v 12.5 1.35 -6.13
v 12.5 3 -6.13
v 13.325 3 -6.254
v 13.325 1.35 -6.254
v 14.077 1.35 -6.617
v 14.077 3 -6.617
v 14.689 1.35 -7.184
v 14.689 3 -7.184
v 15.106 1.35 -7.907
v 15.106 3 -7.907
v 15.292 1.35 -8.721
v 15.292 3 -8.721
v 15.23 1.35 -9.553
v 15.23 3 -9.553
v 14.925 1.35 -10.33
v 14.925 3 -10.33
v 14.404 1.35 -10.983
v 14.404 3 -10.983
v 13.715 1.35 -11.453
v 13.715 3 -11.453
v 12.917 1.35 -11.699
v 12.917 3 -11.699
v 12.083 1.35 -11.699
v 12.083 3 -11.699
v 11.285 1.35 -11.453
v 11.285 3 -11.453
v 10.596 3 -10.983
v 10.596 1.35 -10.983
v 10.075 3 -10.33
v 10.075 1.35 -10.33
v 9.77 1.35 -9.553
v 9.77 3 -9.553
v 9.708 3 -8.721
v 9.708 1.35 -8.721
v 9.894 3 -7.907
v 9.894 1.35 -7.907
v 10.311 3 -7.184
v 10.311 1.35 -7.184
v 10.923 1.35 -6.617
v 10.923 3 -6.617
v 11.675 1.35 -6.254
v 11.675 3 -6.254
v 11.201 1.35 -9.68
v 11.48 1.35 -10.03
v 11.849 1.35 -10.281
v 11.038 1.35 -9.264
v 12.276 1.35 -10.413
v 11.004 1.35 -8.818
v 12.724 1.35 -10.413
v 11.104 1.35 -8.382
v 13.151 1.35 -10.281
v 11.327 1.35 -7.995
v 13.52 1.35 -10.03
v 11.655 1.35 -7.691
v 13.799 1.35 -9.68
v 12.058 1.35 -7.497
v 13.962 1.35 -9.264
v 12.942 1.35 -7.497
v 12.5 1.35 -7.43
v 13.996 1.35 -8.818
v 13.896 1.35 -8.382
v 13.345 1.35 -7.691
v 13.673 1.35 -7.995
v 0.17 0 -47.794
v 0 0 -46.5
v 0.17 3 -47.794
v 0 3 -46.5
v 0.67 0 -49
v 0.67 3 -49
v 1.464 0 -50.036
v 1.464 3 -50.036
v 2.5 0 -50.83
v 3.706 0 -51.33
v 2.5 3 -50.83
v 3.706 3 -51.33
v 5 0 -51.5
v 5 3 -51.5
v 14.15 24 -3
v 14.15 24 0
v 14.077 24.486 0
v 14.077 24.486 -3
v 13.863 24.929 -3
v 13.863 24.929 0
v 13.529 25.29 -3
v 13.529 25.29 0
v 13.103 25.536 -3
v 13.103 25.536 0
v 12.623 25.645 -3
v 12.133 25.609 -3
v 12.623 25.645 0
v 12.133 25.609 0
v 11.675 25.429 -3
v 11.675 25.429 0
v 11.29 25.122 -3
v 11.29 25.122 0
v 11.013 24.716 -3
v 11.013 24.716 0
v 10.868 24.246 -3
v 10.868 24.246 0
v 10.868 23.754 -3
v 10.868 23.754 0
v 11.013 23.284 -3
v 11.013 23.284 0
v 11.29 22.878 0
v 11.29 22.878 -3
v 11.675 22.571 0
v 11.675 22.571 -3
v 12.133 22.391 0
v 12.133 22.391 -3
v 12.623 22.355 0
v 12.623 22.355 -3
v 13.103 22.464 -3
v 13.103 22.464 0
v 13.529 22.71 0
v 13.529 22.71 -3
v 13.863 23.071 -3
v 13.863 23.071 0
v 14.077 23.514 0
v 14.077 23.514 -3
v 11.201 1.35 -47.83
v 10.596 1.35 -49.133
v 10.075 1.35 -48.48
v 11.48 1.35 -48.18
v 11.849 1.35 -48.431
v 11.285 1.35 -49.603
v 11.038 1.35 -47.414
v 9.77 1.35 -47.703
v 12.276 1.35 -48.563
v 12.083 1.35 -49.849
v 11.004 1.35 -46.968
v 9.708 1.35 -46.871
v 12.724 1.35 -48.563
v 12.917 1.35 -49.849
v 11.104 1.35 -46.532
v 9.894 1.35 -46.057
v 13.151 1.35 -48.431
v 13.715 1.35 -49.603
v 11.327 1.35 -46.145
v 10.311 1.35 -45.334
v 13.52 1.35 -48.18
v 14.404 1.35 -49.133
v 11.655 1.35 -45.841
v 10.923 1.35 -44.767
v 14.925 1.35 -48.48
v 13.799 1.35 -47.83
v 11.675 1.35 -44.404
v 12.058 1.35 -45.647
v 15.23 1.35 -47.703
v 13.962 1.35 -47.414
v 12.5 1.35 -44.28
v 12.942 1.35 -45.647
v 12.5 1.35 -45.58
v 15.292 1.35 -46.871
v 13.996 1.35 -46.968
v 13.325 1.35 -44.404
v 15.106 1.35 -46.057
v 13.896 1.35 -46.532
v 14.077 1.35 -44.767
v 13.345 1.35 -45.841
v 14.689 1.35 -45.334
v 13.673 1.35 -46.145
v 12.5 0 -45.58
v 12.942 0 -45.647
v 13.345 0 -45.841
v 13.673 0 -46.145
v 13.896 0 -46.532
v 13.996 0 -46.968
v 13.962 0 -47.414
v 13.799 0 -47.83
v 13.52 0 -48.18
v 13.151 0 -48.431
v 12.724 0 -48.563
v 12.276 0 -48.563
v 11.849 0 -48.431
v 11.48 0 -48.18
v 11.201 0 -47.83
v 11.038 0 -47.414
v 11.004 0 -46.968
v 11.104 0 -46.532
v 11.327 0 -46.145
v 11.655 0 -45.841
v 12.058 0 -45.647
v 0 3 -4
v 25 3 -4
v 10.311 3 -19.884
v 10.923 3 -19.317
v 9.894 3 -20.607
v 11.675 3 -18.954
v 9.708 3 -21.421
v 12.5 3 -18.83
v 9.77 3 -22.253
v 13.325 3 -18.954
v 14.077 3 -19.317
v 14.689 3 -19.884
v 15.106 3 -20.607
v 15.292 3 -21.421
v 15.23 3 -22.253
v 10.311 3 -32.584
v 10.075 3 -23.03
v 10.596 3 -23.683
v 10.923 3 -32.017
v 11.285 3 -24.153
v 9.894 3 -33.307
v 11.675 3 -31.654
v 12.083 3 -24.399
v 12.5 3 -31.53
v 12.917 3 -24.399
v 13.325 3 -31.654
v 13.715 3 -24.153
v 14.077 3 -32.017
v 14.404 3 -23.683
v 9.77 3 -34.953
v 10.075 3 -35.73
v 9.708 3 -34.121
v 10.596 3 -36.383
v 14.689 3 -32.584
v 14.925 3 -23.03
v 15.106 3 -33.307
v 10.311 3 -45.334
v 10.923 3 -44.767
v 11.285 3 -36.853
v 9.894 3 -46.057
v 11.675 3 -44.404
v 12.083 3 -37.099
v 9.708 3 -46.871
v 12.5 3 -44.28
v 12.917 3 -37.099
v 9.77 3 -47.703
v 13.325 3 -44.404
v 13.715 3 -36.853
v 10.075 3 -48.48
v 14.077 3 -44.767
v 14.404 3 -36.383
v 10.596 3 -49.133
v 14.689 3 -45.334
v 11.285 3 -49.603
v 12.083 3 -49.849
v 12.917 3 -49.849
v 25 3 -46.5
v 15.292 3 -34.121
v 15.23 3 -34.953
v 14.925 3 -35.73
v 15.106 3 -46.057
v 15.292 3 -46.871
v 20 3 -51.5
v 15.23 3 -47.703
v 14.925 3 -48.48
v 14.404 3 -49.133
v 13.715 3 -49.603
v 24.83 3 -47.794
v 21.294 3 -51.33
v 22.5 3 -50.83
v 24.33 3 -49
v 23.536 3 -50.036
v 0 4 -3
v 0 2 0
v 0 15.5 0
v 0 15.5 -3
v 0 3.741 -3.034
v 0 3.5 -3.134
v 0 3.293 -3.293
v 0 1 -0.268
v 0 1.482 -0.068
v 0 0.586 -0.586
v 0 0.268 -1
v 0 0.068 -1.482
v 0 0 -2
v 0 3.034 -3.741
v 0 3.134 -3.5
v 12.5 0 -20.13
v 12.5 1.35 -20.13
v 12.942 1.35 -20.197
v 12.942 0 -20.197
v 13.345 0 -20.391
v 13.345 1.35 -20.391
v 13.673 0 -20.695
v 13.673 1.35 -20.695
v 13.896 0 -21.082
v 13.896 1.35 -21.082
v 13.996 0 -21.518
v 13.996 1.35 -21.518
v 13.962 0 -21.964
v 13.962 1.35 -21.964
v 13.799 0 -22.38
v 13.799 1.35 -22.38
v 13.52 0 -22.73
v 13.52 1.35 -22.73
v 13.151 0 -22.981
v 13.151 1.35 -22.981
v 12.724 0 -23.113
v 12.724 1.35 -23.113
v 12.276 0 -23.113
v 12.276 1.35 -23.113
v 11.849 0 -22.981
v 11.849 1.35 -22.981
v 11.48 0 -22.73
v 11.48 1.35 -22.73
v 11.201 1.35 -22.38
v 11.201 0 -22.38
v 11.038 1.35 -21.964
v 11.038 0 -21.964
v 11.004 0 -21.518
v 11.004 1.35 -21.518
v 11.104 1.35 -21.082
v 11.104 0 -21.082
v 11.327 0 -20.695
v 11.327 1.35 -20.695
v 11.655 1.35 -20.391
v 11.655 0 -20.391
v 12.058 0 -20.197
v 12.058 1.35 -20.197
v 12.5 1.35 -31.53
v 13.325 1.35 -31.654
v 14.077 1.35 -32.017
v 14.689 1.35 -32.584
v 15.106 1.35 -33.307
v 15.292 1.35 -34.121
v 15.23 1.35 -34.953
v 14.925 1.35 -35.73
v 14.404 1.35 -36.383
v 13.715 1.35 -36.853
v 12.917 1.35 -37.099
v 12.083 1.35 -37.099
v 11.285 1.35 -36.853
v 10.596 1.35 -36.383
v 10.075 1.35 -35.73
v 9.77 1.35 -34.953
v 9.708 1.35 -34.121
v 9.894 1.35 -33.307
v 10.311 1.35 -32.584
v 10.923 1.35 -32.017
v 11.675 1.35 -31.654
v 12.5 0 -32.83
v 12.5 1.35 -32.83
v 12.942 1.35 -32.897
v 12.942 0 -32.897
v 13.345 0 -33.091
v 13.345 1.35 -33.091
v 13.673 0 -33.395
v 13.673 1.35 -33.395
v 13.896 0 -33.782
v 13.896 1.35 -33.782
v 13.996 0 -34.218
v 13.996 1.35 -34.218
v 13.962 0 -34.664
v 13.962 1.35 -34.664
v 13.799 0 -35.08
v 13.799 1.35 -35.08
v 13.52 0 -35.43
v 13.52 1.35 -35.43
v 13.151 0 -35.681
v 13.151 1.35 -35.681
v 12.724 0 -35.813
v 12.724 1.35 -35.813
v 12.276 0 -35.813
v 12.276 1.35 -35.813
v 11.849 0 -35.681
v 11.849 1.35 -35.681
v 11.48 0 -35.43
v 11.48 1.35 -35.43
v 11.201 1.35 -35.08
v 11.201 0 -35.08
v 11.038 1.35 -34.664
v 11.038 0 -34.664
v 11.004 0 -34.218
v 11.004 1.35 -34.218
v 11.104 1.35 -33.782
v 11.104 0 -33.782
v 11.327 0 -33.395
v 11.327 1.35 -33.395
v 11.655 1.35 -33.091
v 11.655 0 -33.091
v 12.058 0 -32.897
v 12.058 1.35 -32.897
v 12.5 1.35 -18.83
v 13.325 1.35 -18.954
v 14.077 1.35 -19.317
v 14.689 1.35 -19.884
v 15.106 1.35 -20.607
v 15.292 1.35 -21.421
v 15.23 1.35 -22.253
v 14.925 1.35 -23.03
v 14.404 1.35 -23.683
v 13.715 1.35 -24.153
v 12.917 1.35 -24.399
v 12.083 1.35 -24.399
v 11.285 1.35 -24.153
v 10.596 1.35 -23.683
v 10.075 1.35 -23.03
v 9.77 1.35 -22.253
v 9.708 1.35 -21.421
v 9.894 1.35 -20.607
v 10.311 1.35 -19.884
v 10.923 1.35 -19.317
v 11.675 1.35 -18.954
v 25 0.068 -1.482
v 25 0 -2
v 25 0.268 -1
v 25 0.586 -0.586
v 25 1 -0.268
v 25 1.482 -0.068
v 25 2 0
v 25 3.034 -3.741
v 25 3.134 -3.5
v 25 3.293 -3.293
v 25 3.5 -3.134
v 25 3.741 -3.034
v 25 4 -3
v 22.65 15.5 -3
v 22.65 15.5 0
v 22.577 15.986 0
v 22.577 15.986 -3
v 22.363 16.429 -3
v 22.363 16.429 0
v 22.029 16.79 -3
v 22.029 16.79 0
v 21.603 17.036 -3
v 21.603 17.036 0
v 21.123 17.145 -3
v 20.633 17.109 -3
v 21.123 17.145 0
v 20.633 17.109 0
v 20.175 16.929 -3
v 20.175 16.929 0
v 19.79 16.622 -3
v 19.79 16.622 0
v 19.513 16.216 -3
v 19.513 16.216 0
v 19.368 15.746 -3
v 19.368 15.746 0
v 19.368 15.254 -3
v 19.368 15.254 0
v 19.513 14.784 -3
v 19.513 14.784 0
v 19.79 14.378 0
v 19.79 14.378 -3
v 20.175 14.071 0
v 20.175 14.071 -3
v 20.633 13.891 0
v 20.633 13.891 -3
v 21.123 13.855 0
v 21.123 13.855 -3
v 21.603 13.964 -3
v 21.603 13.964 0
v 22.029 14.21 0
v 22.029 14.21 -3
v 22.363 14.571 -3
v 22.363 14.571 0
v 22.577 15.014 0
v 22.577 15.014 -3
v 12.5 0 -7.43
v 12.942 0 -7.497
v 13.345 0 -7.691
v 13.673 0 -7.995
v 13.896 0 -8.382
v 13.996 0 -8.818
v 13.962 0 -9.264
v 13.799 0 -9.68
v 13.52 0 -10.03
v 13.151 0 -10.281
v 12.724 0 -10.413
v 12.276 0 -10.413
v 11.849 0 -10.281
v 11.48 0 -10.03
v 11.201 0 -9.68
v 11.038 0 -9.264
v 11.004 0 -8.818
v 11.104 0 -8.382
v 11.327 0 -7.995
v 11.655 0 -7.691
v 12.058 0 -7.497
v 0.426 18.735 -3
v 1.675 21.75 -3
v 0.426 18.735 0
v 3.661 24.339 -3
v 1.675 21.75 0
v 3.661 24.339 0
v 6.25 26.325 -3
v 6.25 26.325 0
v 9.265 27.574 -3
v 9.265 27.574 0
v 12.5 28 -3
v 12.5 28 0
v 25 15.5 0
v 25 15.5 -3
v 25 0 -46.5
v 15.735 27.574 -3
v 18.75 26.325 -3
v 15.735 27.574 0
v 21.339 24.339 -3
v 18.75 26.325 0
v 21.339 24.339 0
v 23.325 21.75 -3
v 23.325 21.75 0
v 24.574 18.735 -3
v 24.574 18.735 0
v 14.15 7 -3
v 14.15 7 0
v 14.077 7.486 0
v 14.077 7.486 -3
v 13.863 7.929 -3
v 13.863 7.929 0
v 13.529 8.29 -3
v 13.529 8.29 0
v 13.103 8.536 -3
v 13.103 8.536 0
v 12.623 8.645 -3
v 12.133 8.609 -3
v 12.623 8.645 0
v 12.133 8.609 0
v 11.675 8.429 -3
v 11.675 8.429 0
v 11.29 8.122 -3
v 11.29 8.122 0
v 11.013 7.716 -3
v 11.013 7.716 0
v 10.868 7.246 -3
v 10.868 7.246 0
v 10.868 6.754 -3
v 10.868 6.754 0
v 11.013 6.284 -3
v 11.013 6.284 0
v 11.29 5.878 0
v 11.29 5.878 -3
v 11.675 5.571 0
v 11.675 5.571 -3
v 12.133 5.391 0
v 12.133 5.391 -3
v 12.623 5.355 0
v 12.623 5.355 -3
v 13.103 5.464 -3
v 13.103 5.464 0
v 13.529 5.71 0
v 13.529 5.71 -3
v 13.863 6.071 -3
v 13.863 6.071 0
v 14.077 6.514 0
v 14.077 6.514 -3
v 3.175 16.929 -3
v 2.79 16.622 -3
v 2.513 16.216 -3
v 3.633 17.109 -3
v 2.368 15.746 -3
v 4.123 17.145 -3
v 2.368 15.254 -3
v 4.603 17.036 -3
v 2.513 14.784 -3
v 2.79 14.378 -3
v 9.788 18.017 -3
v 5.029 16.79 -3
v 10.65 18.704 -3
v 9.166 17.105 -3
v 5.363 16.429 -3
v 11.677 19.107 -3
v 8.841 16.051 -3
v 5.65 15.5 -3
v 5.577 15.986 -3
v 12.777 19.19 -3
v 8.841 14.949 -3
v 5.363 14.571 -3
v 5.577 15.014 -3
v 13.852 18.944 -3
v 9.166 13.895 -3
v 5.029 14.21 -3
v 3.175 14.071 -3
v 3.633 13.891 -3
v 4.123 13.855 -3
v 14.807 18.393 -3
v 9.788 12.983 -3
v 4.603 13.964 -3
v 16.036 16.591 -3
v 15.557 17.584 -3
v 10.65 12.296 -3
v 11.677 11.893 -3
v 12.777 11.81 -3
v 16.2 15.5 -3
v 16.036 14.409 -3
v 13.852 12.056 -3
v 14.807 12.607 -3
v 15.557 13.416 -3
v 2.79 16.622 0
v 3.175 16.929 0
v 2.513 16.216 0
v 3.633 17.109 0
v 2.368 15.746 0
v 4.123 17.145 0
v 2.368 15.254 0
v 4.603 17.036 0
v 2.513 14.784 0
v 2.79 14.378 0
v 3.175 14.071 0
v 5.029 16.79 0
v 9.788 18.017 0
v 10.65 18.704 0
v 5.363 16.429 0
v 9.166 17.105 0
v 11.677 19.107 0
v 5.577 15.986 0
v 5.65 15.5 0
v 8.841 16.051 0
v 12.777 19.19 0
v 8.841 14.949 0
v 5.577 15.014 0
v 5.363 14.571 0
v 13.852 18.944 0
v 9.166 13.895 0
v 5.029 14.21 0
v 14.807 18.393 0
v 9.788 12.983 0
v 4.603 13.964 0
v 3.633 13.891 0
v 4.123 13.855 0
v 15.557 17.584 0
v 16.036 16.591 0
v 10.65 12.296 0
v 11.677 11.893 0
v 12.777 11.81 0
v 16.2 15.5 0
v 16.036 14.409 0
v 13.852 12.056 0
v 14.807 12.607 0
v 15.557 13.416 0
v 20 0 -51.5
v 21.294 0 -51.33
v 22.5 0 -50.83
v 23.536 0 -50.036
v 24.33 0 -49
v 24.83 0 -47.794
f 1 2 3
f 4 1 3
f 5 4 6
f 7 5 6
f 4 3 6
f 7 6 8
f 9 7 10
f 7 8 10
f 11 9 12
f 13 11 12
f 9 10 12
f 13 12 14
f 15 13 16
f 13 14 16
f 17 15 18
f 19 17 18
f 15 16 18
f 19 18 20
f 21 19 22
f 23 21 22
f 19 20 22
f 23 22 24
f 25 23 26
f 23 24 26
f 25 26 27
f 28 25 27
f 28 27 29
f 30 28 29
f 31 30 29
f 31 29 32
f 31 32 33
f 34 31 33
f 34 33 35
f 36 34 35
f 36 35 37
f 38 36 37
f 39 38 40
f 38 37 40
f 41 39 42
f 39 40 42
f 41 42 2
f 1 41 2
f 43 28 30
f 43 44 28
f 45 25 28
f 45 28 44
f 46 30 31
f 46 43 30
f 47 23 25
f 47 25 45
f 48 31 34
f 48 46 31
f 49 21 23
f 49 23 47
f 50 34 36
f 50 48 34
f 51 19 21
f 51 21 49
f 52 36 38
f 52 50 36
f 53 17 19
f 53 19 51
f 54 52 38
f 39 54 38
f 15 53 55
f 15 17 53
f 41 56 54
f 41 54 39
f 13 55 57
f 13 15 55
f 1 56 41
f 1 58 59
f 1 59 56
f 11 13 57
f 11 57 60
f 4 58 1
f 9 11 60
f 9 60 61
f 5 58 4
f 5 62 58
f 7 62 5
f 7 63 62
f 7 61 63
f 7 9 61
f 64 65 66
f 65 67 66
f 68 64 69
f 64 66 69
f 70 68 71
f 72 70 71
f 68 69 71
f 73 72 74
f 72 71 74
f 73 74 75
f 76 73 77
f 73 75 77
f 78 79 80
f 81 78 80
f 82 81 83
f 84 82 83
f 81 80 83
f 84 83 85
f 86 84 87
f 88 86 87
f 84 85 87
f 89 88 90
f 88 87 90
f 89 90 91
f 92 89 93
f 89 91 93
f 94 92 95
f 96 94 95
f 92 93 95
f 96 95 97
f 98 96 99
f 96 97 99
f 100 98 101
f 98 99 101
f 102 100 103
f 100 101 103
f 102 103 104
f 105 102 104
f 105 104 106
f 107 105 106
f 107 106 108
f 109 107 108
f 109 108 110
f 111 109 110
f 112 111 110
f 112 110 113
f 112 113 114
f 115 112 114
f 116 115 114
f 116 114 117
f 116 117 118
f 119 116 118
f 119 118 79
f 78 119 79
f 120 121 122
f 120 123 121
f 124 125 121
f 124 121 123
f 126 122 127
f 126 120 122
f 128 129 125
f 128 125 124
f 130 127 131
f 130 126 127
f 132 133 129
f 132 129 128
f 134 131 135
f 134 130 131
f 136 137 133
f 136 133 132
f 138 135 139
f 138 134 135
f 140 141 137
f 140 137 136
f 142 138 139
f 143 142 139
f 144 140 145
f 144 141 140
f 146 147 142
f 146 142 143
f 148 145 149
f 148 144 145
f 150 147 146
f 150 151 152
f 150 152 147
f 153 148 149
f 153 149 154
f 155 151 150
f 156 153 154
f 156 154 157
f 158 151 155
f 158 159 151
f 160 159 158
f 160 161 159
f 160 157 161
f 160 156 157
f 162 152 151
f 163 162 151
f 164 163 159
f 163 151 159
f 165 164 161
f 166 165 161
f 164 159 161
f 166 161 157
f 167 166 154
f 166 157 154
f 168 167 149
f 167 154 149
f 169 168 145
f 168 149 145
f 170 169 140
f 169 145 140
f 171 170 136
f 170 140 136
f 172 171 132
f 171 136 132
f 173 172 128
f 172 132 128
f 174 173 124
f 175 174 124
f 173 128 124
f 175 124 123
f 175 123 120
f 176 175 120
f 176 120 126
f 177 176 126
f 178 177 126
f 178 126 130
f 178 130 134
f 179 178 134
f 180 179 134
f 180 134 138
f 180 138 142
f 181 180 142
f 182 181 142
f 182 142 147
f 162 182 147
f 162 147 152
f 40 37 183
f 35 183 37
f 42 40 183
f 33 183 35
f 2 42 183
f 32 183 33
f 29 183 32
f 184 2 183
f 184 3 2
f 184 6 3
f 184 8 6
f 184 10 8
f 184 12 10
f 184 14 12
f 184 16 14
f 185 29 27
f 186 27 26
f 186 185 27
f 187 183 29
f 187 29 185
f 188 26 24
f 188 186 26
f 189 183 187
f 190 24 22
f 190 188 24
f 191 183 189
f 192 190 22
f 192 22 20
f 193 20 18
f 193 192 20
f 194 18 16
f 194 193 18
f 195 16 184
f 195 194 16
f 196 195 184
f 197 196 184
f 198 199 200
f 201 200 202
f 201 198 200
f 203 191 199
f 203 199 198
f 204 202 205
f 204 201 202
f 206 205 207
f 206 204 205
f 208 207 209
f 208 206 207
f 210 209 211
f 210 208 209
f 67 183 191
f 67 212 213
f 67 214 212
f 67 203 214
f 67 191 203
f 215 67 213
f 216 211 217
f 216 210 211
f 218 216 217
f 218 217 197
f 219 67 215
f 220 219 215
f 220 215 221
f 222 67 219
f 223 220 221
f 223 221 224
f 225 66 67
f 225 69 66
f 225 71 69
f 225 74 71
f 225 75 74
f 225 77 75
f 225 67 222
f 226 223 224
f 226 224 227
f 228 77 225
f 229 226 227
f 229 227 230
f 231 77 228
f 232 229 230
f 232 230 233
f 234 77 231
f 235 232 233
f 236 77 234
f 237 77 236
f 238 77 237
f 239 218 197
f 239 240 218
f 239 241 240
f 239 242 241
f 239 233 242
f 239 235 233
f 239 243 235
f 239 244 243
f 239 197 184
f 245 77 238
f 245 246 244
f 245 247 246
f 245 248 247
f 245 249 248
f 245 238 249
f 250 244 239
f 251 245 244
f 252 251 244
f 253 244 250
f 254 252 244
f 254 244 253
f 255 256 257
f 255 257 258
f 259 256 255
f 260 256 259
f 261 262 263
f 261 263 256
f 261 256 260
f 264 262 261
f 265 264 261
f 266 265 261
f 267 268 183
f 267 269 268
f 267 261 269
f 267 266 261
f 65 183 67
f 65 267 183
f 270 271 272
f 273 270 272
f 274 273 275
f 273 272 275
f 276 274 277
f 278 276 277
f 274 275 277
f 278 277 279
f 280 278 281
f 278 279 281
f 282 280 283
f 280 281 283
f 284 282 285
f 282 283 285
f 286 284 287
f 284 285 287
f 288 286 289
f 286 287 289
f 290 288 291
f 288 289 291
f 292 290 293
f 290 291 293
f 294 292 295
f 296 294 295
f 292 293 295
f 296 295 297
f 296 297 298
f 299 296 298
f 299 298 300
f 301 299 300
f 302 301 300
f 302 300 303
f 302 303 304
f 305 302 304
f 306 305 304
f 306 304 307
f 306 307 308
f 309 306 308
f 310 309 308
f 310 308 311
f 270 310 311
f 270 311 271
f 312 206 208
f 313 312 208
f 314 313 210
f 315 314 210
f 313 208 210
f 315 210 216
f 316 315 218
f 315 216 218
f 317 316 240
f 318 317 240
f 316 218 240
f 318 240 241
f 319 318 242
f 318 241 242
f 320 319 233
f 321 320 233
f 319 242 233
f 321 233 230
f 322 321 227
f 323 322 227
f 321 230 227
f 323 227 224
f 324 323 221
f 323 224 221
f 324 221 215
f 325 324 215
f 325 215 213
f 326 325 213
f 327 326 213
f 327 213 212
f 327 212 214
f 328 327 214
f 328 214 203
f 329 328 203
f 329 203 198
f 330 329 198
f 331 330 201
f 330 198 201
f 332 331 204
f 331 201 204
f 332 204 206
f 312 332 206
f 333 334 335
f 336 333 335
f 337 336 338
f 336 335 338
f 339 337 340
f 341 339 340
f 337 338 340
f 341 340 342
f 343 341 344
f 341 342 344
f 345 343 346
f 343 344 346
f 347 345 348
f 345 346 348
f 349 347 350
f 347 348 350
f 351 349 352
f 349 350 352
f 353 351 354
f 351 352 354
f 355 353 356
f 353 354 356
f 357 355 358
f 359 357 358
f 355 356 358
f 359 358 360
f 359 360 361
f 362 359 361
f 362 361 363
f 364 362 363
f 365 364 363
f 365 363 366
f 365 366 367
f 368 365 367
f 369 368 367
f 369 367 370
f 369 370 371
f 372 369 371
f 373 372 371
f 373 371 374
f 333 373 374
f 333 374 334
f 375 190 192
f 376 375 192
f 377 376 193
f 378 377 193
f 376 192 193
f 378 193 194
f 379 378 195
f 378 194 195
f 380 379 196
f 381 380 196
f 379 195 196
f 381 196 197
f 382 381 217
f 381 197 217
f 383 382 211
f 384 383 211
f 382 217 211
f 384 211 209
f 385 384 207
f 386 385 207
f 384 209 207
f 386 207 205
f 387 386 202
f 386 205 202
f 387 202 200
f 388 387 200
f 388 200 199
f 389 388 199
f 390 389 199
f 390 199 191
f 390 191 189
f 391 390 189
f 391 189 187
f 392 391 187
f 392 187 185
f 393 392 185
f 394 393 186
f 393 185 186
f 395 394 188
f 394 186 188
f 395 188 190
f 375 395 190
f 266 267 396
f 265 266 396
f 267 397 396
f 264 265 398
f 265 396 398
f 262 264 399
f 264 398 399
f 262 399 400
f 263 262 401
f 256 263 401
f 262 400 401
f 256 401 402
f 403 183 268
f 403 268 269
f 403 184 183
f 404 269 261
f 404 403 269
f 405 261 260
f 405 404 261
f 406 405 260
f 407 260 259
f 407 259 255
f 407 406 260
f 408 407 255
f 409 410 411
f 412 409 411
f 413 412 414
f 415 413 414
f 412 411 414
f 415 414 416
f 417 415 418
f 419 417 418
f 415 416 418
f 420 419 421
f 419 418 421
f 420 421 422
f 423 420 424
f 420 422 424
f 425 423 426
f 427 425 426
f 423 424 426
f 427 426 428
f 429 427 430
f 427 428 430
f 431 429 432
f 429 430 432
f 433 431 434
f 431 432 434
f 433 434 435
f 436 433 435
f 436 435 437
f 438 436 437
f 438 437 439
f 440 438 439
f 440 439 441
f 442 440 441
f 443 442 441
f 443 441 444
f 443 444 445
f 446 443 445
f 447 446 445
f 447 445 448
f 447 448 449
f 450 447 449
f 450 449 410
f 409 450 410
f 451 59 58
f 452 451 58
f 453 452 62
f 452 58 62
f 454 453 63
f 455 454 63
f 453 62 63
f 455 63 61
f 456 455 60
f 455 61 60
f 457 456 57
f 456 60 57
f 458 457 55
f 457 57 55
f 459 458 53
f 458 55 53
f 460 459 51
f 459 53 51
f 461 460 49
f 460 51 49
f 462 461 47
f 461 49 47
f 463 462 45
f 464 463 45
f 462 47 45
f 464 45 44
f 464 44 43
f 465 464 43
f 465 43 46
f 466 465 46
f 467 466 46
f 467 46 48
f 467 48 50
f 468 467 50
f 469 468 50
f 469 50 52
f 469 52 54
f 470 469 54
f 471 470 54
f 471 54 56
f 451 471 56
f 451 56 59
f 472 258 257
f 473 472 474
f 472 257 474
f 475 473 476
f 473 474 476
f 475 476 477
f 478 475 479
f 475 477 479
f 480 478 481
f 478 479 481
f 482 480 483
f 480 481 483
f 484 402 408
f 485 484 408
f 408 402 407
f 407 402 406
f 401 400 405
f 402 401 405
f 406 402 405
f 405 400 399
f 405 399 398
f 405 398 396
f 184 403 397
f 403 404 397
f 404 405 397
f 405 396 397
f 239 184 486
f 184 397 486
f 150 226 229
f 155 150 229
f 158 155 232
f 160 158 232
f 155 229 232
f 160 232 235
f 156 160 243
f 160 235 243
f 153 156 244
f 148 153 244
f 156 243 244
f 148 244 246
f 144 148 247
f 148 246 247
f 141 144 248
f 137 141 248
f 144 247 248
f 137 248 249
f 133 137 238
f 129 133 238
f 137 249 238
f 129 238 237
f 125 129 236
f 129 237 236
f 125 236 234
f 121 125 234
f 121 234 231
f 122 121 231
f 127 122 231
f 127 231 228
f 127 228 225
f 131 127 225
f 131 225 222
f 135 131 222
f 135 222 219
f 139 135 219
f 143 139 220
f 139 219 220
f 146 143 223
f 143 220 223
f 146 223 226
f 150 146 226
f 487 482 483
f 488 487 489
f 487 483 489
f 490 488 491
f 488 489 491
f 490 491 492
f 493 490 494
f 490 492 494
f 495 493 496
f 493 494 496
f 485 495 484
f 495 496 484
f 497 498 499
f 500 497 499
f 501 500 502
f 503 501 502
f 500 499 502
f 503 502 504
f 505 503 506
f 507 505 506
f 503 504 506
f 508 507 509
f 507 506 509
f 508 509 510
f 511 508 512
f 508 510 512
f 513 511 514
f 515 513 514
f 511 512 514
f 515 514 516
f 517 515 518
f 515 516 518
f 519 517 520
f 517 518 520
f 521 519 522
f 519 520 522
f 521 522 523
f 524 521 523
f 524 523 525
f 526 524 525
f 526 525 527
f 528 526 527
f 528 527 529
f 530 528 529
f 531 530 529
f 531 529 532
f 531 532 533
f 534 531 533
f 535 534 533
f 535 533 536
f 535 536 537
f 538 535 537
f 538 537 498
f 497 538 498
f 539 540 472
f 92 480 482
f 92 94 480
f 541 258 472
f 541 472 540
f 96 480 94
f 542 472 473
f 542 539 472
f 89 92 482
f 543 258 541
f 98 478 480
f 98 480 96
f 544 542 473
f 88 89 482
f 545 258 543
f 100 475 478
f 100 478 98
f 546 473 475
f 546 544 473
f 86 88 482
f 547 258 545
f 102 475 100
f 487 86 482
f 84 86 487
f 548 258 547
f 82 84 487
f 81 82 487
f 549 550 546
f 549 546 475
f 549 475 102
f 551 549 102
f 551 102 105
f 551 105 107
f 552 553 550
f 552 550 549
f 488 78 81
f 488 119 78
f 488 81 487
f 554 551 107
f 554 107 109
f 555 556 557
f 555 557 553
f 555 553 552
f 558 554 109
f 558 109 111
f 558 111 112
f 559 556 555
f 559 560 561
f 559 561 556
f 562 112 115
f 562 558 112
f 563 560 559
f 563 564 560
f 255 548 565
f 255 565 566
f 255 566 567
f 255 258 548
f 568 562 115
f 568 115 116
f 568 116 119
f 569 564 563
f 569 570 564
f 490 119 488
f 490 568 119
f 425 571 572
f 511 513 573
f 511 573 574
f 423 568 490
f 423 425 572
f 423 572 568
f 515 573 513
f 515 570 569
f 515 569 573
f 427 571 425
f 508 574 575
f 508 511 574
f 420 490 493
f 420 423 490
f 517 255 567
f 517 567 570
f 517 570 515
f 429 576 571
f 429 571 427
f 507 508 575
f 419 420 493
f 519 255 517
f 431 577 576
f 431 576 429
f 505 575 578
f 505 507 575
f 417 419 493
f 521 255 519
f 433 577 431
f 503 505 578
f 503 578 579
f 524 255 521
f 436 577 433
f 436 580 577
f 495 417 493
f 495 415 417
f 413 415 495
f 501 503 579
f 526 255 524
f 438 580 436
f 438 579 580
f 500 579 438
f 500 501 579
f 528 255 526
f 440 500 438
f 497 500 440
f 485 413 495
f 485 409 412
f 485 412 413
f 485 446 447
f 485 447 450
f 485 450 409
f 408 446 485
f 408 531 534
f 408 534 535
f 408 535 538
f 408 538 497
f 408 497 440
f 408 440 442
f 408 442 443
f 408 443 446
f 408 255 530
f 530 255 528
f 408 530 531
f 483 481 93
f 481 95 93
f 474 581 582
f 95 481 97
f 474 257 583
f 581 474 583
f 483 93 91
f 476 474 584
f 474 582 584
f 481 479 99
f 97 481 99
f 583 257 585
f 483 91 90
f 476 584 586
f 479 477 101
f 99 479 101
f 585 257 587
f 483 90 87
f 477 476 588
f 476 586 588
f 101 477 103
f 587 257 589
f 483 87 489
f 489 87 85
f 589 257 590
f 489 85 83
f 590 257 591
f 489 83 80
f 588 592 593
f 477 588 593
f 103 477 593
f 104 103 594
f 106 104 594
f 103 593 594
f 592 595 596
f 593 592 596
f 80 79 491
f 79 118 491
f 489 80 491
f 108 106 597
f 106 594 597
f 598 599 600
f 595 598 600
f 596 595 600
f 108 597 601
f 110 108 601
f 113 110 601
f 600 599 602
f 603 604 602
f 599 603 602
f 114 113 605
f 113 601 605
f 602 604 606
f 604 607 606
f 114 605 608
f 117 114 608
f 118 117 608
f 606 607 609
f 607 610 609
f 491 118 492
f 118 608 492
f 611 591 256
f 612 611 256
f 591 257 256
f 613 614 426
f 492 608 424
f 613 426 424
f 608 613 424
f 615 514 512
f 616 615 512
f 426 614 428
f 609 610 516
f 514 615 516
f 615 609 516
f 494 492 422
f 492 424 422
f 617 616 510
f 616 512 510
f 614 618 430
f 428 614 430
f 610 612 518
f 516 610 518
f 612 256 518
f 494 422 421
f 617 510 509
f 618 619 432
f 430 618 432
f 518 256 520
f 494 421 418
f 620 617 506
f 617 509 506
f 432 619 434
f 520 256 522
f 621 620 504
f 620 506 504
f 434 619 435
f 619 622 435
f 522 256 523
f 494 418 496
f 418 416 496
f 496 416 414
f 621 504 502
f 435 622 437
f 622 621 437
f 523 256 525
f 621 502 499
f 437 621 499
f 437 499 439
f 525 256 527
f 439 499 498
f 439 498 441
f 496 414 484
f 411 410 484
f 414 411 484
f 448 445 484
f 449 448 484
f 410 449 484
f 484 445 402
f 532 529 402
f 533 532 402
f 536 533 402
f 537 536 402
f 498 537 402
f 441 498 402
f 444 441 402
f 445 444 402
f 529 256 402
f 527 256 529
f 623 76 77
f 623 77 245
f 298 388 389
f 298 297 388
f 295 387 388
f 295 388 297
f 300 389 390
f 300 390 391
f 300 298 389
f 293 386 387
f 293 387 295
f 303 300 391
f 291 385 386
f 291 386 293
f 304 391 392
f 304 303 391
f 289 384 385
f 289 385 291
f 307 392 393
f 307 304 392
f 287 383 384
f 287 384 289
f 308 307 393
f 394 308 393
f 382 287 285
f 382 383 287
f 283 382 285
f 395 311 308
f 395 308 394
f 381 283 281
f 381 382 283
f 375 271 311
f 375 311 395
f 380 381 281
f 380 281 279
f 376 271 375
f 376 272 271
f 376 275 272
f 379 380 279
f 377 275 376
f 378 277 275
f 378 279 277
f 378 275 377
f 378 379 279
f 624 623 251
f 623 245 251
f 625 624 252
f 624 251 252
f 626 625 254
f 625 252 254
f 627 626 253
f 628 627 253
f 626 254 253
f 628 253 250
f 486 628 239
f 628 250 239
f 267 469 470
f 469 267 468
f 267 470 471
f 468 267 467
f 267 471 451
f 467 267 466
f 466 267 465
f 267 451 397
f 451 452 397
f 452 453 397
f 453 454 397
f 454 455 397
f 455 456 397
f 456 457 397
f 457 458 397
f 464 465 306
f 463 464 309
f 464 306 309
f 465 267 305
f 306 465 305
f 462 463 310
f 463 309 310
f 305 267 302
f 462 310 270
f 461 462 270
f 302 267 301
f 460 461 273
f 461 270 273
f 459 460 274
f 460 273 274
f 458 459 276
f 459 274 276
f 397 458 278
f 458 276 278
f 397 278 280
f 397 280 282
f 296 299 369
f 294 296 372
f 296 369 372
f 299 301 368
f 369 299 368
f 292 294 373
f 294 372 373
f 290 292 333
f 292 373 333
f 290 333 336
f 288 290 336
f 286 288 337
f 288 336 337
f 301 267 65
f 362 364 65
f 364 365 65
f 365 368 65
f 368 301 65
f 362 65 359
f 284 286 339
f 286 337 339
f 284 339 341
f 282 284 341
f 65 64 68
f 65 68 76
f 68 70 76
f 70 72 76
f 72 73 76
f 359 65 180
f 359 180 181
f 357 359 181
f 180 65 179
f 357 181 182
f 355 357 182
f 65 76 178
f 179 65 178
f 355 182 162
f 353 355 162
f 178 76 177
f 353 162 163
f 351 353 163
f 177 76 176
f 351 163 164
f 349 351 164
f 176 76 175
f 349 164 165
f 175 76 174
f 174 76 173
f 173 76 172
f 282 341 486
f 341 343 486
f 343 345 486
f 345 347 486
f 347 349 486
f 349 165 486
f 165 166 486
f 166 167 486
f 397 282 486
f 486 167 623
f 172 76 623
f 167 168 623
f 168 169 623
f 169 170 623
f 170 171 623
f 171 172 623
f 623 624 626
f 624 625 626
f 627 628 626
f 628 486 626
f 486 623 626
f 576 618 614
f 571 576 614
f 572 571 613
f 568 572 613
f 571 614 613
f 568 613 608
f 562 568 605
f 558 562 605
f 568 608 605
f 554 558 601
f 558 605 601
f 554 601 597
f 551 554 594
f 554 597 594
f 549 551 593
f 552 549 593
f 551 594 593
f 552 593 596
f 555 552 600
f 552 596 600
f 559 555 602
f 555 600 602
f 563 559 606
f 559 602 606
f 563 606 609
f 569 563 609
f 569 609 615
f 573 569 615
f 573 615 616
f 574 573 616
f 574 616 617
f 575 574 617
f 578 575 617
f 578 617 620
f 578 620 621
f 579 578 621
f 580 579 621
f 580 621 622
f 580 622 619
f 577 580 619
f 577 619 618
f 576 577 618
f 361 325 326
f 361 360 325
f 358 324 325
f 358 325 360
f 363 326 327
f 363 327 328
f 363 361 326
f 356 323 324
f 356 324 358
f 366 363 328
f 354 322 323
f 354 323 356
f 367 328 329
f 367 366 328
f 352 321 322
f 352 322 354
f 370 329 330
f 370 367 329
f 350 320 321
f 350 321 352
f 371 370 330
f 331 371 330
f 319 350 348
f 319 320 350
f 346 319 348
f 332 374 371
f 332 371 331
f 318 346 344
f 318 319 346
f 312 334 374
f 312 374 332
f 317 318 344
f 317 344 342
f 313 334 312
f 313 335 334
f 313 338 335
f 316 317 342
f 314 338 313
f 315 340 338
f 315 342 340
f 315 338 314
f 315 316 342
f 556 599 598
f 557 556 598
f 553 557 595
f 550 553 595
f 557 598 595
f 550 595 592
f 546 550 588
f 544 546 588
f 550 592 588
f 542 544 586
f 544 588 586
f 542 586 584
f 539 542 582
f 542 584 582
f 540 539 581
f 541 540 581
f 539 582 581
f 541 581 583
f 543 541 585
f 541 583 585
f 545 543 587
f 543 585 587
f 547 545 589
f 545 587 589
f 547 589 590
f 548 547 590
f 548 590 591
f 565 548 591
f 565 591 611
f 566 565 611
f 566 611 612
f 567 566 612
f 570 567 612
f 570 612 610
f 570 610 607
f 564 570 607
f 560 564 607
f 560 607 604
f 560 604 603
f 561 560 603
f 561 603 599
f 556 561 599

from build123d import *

# Parameters (mm, degrees)
ESBO_O1_W                = 25
ESBO_O1_H                = 51.5
RESSALTO_EXTRUS_O1_DEPTH = 3
ESBO_O4_W                = 25
ESBO_O4_H                = 3
RESSALTO_EXTRUS_O2_DEPTH = 25
ESBO_O5_R                = 1.65
ESBO_O5_R_2              = 3.7
CORTE_EXTRUS_O1_DEPTH    = 25
ESBO_O7_R                = 1.5
CORTE_EXTRUS_O2_DEPTH    = 25
FILETE1_R                = 5
FILETE2_R                = 2
FILETE3_R                = 1
ESBO_O8_R                = 2.8
CORTE_EXTRUS_O3_DEPTH    = 1.65


with BuildPart() as part:
    # Esboço1 → Ressalto-extrusão1 (new body)
    with BuildSketch(Plane(origin=(0, 0, 0), x_dir=(1, 0, 0), z_dir=(0, 1, 0))):
        with Locations((12.5, 25.75)):
            Rectangle(ESBO_O1_W, ESBO_O1_H)
    extrude(amount=RESSALTO_EXTRUS_O1_DEPTH)

    # Esboço4 → Ressalto-extrusão2 (add)
    with BuildSketch(Plane(origin=(0, 3, 0), x_dir=(1, 0, 0), z_dir=(0, 1, 0))):
        with Locations((12.5, 1.5)):
            Rectangle(ESBO_O4_W, ESBO_O4_H)
    extrude(amount=RESSALTO_EXTRUS_O2_DEPTH)

    # Esboço5 → Corte-extrusão1 (cut)
    with BuildSketch(Plane.XY):
        with Locations((4, 15.5)):
            Circle(ESBO_O5_R)
        with BuildLine():
            ThreePointArc((0, 15.5), (3.661165235, 24.338834765), (12.5, 28))
            Line((12.5, 28), (0, 28))
            Line((0, 28), (0, 15.5))
        make_face()
        with Locations((12.5, 24)):
            Circle(ESBO_O5_R)
        with Locations((12.5, 15.5)):
            Circle(ESBO_O5_R_2)
        with Locations((21, 15.5)):
            Circle(ESBO_O5_R)
        with Locations((12.5, 7)):
            Circle(ESBO_O5_R)
        with BuildLine():
            ThreePointArc((12.5, 28), (21.338834765, 24.338834765), (25, 15.5))
            Line((25, 15.5), (25, 28))
            Line((25, 28), (12.5, 28))
        make_face()
    extrude(amount=-CORTE_EXTRUS_O1_DEPTH, mode=Mode.SUBTRACT)

    # Esboço7 → Corte-extrusão2 (cut)
    with BuildSketch(Plane(origin=(0, 3, 0), x_dir=(1, 0, 0), z_dir=(0, 1, 0))):
        with Locations(Location((12.5, 34.33, 0), (0, 0, 270))):
            Circle(ESBO_O7_R)
        with Locations(Location((12.5, 21.63, 0), (0, 0, 270))):
            Circle(ESBO_O7_R)
        with Locations(Location((12.5, 8.93, 0), (0, 0, 270))):
            Circle(ESBO_O7_R)
        with Locations(Location((12.5, 47.08, 0), (0, 0, 270))):
            Circle(ESBO_O7_R)
    extrude(amount=-CORTE_EXTRUS_O2_DEPTH, mode=Mode.SUBTRACT)

    # Filete1
    filete1_edges = [part.edges().sort_by_distance(p)[0] for p in [
        (0, 1.5, -51.5),
        (25, 1.5, -51.5),
    ]]
    fillet(filete1_edges, radius=FILETE1_R)

    # Filete2
    filete2_edges = [part.edges().sort_by_distance(p)[0] for p in [
        (12.5, 0, 0),
    ]]
    fillet(filete2_edges, radius=FILETE2_R)

    # Filete3
    filete3_edges = [part.edges().sort_by_distance(p)[0] for p in [
        (12.5, 3, -3),
    ]]
    fillet(filete3_edges, radius=FILETE3_R)

    # Esboço8 → Corte-extrusão3 (cut)
    with BuildSketch(Plane(origin=(0, 3, 0), x_dir=(1, 0, 0), z_dir=(0, 1, 0))):
        with Locations(Location((12.5, 47.08, 0), (0, 0, 270))):
            Circle(ESBO_O8_R)
        with Locations(Location((12.5, 34.33, 0), (0, 0, 270))):
            Circle(ESBO_O8_R)
        with Locations(Location((12.5, 21.63, 0), (0, 0, 270))):
            Circle(ESBO_O8_R)
        with Locations(Location((12.5, 8.93, 0), (0, 0, 270))):
            Circle(ESBO_O8_R)
    extrude(amount=-CORTE_EXTRUS_O3_DEPTH, mode=Mode.SUBTRACT)


solid = part.part
